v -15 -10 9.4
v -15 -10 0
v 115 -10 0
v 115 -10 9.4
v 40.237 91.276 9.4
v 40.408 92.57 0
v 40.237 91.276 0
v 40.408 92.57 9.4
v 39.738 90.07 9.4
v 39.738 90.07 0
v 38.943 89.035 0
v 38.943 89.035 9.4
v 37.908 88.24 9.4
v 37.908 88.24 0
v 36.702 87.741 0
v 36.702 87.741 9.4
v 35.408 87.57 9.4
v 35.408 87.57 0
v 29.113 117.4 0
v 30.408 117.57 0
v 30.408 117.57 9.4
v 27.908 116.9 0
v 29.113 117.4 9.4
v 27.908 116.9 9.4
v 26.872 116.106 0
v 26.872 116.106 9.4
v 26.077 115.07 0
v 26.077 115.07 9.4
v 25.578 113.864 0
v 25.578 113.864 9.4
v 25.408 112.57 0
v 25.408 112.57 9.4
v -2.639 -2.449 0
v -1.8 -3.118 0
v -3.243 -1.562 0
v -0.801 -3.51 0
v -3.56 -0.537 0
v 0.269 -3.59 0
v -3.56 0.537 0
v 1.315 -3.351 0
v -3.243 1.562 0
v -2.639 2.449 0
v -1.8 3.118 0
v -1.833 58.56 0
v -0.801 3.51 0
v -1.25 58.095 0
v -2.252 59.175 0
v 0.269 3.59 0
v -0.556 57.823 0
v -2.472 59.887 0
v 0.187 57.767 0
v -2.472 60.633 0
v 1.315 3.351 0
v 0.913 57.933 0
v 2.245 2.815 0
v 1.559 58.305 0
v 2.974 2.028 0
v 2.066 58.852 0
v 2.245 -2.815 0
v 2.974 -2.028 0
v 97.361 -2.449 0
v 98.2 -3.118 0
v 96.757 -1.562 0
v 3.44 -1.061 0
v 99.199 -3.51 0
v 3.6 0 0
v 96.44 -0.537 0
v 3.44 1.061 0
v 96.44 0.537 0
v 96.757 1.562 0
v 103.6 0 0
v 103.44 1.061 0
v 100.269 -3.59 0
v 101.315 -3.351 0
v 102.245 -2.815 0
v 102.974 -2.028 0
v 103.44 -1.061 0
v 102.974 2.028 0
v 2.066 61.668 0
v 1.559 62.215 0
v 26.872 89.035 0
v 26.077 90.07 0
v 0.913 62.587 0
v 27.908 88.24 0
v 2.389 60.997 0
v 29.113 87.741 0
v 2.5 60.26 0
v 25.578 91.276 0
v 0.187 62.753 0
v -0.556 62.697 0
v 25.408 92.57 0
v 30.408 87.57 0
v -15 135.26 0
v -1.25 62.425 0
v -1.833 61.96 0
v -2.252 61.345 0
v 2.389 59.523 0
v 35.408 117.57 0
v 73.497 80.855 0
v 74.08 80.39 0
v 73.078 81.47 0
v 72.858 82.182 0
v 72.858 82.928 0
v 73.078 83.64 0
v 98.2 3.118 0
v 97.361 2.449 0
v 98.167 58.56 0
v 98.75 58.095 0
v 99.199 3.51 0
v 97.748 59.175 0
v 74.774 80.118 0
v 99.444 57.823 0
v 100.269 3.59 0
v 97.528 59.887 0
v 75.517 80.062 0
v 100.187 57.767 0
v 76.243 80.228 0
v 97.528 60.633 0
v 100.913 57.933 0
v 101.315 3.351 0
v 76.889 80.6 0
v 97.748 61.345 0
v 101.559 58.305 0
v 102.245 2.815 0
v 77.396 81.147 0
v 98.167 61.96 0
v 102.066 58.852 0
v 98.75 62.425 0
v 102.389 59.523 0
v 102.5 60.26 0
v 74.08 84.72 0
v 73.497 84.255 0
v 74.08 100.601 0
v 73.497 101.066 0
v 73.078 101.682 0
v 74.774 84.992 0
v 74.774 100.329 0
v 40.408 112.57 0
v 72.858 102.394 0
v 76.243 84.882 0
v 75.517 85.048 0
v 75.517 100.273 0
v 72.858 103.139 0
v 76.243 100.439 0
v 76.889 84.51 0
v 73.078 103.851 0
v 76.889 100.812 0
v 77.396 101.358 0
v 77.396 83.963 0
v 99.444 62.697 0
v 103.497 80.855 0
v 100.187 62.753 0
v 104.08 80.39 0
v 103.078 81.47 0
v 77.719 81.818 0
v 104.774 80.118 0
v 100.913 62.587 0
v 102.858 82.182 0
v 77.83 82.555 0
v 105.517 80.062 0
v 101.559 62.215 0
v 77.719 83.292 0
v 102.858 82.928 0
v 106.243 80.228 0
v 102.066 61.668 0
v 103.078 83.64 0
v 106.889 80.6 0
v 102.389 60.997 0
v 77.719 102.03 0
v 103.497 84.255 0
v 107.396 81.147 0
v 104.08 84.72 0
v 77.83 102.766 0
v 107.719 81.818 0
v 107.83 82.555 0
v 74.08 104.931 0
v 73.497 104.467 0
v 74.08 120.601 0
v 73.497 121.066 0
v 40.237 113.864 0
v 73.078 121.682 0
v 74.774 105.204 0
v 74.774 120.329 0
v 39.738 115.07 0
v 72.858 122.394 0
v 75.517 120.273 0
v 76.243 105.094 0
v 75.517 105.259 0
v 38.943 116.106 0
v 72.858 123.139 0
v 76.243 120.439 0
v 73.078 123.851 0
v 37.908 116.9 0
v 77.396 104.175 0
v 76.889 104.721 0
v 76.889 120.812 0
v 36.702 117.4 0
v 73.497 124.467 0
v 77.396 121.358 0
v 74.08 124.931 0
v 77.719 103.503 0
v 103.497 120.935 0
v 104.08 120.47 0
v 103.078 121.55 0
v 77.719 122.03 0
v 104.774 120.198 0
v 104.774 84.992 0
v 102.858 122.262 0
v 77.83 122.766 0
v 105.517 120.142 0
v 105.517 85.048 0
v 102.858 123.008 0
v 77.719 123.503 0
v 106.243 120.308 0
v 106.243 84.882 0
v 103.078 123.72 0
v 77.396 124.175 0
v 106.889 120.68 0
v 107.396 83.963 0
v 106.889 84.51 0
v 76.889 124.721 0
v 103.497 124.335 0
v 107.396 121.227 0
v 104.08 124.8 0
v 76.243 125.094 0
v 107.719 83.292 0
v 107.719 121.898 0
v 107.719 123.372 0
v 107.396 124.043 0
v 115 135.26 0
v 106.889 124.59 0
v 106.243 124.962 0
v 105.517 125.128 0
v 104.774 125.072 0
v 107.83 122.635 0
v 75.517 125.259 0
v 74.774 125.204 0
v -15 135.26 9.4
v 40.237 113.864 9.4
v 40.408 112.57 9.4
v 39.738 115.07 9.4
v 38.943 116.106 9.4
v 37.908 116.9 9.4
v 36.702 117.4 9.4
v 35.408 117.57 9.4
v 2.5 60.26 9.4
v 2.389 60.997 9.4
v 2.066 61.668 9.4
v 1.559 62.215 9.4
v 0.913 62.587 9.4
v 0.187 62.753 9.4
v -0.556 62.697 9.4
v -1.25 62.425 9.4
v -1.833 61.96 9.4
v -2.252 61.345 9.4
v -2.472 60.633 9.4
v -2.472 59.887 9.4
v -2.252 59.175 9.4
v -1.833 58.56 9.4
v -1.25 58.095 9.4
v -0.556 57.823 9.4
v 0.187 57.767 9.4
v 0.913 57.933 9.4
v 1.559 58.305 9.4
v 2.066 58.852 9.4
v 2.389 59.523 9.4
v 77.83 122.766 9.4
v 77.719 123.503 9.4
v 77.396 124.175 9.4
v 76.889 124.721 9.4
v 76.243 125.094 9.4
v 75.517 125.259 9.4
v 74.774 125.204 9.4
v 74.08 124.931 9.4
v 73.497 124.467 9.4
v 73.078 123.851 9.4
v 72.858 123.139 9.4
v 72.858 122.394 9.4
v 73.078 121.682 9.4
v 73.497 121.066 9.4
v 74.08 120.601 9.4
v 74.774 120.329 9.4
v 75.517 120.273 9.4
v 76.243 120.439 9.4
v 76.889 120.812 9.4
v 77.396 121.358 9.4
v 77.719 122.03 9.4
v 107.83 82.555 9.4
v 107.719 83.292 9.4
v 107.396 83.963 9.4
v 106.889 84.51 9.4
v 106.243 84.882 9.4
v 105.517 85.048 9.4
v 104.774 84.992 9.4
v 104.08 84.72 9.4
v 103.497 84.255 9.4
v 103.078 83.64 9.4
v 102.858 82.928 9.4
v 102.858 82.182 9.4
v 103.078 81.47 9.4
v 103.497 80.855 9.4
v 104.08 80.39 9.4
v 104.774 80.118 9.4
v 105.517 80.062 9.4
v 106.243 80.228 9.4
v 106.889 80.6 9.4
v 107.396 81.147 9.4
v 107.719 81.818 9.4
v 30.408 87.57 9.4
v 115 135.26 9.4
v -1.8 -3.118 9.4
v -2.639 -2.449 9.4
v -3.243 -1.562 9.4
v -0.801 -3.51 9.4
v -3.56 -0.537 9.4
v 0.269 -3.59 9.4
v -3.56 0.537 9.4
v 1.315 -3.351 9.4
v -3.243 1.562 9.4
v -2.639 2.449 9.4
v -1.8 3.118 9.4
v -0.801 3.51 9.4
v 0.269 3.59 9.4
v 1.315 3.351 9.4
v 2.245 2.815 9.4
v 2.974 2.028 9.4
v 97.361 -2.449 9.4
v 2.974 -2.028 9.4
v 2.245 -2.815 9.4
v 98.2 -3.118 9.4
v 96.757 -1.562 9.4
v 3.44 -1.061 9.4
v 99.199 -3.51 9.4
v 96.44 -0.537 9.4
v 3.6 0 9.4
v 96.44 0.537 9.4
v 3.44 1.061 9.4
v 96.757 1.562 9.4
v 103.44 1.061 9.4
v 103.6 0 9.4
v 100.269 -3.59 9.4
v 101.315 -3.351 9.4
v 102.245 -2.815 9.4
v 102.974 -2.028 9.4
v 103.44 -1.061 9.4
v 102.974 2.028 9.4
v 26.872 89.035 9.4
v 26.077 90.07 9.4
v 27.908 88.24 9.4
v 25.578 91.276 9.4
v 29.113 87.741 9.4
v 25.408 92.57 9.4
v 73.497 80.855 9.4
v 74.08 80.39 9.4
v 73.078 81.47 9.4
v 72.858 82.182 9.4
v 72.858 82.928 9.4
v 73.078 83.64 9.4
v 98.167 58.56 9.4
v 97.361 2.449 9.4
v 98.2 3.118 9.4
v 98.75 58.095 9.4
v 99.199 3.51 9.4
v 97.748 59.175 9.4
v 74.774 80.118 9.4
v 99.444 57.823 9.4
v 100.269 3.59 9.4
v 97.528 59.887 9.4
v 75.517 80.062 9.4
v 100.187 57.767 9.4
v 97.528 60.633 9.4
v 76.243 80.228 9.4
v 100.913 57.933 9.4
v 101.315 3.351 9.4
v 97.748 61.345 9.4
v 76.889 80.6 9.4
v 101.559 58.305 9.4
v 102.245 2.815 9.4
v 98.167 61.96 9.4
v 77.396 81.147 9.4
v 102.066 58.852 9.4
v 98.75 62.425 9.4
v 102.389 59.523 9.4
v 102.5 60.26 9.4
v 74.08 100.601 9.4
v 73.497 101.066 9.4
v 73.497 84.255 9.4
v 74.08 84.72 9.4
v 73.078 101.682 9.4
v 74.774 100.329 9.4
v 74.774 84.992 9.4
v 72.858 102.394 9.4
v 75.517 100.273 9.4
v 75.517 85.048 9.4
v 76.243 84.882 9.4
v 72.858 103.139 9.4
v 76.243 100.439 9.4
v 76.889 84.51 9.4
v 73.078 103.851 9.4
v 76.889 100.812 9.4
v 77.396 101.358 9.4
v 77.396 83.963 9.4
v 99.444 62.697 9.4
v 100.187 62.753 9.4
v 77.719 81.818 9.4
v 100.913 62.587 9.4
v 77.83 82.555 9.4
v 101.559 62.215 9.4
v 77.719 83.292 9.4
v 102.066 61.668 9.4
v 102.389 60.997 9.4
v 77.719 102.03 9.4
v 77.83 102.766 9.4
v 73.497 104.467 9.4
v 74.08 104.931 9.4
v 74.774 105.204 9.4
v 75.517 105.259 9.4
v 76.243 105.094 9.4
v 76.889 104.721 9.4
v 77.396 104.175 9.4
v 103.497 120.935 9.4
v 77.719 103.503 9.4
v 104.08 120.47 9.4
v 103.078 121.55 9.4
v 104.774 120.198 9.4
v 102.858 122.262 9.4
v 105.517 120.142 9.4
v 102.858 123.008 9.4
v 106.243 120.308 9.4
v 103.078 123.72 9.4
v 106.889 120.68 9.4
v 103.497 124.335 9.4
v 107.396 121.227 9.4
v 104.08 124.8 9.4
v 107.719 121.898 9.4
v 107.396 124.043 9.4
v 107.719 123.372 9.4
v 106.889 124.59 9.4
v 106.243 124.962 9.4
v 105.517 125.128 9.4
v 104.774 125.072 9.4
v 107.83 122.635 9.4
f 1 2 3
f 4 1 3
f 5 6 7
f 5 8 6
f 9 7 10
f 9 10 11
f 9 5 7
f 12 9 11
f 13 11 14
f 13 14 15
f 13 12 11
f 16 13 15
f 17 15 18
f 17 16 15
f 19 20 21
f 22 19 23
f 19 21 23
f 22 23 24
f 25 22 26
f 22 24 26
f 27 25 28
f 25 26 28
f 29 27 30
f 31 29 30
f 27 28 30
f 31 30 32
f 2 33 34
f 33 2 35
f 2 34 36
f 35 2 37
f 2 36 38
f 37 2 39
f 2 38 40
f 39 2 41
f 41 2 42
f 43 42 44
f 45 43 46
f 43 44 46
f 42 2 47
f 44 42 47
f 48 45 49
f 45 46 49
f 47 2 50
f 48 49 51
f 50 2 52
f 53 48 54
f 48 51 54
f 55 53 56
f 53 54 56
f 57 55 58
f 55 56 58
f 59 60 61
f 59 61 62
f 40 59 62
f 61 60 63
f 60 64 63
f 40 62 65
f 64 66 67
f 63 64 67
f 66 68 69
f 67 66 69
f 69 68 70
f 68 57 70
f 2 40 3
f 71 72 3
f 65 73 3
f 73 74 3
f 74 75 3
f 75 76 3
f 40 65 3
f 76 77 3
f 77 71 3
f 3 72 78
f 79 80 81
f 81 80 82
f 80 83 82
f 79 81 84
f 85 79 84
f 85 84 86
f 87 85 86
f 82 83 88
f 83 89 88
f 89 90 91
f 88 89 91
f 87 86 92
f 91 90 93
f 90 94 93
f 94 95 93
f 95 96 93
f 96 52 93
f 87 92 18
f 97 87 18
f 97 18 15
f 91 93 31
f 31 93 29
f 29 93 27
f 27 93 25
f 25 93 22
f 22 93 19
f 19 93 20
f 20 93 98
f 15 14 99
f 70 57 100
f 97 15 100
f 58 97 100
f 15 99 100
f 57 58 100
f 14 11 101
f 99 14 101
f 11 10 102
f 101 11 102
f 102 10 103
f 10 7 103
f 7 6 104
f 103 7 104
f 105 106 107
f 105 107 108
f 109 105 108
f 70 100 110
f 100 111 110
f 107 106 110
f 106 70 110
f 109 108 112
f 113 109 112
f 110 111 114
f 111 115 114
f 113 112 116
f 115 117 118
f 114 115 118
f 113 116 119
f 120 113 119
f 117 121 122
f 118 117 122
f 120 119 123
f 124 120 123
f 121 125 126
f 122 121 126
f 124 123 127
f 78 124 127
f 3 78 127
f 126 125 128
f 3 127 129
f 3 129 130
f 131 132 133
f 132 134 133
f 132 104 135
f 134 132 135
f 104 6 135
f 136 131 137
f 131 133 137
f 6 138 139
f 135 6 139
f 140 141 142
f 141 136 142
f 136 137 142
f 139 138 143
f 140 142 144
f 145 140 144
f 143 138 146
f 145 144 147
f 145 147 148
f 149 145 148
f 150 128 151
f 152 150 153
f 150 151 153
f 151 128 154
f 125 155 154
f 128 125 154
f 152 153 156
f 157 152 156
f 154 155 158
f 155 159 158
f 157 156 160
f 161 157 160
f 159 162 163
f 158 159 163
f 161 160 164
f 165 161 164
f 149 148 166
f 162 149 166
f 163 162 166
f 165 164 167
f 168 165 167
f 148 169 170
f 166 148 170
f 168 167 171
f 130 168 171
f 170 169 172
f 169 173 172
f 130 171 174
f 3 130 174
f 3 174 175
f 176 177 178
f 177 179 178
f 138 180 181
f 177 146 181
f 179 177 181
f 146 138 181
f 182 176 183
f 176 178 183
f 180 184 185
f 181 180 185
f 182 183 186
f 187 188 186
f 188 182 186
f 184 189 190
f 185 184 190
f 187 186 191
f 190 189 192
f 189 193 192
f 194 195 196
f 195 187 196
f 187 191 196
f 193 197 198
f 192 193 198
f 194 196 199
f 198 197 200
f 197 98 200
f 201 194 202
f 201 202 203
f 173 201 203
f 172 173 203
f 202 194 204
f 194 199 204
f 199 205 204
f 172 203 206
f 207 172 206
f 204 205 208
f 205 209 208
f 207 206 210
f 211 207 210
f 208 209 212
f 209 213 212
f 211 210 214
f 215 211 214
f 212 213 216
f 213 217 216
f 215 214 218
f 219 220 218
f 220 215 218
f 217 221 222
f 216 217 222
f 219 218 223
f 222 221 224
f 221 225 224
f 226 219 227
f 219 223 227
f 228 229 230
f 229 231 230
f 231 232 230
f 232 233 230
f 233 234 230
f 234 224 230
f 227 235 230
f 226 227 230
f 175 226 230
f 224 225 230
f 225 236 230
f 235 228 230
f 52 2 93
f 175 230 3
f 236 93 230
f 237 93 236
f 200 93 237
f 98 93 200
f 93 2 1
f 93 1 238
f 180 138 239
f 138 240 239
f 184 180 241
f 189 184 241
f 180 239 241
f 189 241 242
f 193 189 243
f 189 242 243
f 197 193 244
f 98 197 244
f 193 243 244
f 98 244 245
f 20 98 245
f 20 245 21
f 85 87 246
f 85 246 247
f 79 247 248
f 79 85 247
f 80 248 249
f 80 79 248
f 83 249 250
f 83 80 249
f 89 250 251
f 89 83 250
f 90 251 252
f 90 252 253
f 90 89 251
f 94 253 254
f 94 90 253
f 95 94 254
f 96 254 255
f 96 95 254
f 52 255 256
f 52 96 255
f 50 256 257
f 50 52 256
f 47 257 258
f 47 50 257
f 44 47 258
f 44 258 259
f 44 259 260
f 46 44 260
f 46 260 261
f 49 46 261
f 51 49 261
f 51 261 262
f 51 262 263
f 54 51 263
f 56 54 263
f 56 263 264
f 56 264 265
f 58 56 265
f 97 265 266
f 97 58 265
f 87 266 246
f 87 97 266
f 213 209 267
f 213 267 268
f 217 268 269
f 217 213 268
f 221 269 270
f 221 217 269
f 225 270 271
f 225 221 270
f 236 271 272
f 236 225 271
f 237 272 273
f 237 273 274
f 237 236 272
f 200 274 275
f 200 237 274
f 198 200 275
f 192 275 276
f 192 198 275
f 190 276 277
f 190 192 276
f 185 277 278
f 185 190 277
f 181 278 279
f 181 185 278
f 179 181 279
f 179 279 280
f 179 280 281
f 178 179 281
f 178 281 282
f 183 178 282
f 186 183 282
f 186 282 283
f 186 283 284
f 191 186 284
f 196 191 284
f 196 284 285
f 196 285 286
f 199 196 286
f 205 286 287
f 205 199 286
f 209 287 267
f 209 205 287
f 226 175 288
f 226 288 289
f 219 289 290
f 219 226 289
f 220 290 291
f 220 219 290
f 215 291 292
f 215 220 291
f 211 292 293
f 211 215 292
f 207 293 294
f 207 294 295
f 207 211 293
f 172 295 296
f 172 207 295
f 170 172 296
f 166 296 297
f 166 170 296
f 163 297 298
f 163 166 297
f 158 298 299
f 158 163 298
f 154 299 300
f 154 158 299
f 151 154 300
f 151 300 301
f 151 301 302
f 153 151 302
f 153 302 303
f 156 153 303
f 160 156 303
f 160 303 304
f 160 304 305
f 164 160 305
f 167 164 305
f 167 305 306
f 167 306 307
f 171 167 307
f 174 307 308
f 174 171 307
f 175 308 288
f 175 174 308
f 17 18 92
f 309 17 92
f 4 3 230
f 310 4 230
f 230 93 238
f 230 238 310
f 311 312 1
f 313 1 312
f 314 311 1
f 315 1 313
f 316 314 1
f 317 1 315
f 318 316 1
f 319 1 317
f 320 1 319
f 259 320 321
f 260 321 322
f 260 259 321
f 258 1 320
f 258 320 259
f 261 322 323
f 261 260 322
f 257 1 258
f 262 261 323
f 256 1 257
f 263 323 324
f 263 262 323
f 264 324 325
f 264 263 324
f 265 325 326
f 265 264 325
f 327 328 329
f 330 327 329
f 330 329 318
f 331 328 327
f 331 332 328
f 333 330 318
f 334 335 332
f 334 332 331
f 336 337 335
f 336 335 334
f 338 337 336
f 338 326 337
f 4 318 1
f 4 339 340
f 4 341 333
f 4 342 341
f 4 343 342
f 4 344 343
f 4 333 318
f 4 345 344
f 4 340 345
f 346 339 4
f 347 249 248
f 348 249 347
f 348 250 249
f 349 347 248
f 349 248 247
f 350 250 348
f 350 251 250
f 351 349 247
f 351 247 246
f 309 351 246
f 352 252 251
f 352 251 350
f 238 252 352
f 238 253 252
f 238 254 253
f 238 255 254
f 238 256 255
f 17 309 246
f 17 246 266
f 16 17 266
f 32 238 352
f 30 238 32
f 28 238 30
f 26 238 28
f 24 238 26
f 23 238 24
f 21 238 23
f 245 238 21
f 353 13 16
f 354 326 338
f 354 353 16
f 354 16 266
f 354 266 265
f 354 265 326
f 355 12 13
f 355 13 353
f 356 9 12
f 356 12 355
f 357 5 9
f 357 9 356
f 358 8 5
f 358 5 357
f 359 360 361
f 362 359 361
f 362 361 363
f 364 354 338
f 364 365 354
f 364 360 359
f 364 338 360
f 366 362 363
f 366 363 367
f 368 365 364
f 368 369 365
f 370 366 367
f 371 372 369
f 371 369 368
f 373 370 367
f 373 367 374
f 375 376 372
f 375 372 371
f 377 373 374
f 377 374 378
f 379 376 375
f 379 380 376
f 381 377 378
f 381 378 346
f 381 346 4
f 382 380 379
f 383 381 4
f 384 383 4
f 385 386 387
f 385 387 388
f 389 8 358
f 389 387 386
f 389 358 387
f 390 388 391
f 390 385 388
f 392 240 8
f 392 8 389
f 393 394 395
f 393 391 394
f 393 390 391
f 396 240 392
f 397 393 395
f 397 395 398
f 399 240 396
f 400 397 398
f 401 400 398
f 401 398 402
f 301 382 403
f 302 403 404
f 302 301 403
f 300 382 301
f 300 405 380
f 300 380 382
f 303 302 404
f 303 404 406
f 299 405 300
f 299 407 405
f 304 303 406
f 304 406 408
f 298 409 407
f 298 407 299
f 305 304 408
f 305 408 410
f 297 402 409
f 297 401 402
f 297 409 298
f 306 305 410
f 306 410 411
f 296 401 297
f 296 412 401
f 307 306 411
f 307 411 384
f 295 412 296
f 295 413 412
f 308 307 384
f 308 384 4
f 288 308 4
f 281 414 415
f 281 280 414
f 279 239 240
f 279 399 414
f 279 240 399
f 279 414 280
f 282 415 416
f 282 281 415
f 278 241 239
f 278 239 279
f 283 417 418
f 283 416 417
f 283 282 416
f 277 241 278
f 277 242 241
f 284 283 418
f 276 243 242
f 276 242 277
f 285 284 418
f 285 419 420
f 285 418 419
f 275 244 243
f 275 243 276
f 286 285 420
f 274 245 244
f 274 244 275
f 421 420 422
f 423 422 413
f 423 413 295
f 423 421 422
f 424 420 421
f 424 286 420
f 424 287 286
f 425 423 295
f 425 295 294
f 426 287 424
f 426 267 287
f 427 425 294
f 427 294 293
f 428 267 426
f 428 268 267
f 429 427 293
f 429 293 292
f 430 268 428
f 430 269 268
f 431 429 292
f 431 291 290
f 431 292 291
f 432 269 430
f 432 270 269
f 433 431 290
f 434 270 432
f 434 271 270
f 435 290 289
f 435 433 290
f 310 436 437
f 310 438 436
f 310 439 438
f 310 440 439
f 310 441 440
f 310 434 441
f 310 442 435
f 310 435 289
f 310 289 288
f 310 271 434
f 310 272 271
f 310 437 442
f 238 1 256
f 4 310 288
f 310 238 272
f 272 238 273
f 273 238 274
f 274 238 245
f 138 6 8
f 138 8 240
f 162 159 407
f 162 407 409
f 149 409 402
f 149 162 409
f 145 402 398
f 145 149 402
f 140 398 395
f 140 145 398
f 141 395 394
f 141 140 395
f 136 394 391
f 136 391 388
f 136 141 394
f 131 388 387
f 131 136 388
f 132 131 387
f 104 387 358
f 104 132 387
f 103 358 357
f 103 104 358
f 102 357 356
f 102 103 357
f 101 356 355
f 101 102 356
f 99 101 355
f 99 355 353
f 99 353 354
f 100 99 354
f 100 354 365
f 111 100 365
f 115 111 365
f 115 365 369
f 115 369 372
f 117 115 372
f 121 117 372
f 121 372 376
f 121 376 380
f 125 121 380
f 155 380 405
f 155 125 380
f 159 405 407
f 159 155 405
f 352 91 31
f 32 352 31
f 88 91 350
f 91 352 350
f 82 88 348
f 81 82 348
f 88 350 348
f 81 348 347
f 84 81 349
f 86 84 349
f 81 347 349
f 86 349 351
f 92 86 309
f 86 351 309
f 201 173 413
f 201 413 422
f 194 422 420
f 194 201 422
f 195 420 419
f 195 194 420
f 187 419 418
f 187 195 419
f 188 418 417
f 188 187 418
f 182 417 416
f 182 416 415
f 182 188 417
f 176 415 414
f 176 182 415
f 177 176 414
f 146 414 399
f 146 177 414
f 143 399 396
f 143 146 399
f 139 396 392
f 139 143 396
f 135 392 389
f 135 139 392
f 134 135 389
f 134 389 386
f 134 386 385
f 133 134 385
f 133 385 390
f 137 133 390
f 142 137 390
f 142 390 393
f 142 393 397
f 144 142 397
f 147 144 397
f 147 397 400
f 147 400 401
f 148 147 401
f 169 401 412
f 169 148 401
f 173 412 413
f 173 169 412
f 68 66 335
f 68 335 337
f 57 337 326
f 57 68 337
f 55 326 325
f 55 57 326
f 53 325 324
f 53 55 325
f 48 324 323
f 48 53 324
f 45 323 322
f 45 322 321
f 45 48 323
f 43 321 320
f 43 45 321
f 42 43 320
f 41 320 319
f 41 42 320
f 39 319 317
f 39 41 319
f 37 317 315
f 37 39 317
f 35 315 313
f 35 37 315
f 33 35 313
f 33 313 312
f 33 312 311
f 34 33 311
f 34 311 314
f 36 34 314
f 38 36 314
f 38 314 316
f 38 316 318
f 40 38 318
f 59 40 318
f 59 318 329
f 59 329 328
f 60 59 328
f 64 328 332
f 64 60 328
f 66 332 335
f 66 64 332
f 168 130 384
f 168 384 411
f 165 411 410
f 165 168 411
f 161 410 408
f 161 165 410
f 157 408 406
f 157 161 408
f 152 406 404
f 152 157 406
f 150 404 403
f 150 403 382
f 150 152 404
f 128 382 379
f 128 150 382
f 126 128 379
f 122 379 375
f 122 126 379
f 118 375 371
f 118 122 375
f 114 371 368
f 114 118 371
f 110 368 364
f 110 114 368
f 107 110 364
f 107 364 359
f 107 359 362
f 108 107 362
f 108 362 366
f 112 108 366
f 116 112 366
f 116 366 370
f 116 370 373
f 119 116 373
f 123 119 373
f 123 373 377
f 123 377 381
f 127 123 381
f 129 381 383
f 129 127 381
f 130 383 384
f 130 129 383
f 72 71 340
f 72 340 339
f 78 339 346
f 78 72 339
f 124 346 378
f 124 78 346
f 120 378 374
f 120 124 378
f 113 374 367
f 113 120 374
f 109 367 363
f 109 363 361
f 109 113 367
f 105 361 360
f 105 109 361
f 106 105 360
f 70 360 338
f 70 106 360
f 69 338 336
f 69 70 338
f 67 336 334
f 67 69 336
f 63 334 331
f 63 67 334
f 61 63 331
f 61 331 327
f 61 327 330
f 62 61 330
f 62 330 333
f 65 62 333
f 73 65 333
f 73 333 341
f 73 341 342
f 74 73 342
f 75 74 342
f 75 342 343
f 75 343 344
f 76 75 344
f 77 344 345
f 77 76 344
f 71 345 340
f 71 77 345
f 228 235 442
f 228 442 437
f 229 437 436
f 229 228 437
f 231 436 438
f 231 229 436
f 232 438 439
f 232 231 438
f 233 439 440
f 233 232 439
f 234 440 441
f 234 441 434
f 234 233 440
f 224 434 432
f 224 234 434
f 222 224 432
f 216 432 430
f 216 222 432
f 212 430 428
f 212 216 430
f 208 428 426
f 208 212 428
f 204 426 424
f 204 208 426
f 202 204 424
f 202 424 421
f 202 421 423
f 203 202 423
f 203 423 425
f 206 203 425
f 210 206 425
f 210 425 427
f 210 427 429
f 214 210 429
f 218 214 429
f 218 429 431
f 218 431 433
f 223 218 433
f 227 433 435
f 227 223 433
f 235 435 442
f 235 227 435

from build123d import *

# Parameters (mm, degrees)
SKETCH1_W           = 130
SKETCH1_H           = 145.26
SKETCH1_R           = 3.6
SKETCH1_R_2         = 2.5
BOSS_EXTRUDE1_DEPTH = 9.4
SKETCH2_W           = 15
SKETCH2_H           = 30
CUT_EXTRUDE1_DEPTH  = 10.4
FILLET1_R           = 5


with BuildPart() as part:
    # Sketch1 → Boss-Extrude1 (new body)
    with BuildSketch(Plane.XY):
        with Locations((50, 62.63)):
            Rectangle(SKETCH1_W, SKETCH1_H)
        Circle(SKETCH1_R, mode=Mode.SUBTRACT)
        with Locations((0, 60.26)):
            Circle(SKETCH1_R_2, mode=Mode.SUBTRACT)
        with Locations((100, 60.26)):
            Circle(SKETCH1_R_2, mode=Mode.SUBTRACT)
        with Locations((100, 0)):
            Circle(SKETCH1_R, mode=Mode.SUBTRACT)
        with Locations((75.33, 82.555)):
            Circle(SKETCH1_R_2, mode=Mode.SUBTRACT)
        with Locations((105.33, 82.555)):
            Circle(SKETCH1_R_2, mode=Mode.SUBTRACT)
        with Locations((105.33, 122.635)):
            Circle(SKETCH1_R_2, mode=Mode.SUBTRACT)
        with Locations((75.33, 102.766411568)):
            Circle(SKETCH1_R_2, mode=Mode.SUBTRACT)
        with Locations((75.33, 122.766411568)):
            Circle(SKETCH1_R_2, mode=Mode.SUBTRACT)
    extrude(amount=BOSS_EXTRUDE1_DEPTH)

    # Sketch2 → Cut-Extrude1 (cut, through all)
    with BuildSketch(Plane(origin=(0, 0, 0), x_dir=(-1, 0, 0), z_dir=(0, 0, -1))):
        with Locations((-32.90754614, 102.570367495)):
            Rectangle(SKETCH2_W, SKETCH2_H)
    extrude(amount=-CUT_EXTRUDE1_DEPTH, mode=Mode.SUBTRACT)

    # Fillet1
    fillet1_edges = [part.edges().sort_by_distance(p)[0] for p in [
        (40.40754614, 87.570367495, 4.7),
        (40.40754614, 117.570367495, 4.7),
        (25.40754614, 117.570367495, 4.7),
        (25.40754614, 87.570367495, 4.7),
    ]]
    fillet(fillet1_edges, radius=FILLET1_R)


solid = part.part
